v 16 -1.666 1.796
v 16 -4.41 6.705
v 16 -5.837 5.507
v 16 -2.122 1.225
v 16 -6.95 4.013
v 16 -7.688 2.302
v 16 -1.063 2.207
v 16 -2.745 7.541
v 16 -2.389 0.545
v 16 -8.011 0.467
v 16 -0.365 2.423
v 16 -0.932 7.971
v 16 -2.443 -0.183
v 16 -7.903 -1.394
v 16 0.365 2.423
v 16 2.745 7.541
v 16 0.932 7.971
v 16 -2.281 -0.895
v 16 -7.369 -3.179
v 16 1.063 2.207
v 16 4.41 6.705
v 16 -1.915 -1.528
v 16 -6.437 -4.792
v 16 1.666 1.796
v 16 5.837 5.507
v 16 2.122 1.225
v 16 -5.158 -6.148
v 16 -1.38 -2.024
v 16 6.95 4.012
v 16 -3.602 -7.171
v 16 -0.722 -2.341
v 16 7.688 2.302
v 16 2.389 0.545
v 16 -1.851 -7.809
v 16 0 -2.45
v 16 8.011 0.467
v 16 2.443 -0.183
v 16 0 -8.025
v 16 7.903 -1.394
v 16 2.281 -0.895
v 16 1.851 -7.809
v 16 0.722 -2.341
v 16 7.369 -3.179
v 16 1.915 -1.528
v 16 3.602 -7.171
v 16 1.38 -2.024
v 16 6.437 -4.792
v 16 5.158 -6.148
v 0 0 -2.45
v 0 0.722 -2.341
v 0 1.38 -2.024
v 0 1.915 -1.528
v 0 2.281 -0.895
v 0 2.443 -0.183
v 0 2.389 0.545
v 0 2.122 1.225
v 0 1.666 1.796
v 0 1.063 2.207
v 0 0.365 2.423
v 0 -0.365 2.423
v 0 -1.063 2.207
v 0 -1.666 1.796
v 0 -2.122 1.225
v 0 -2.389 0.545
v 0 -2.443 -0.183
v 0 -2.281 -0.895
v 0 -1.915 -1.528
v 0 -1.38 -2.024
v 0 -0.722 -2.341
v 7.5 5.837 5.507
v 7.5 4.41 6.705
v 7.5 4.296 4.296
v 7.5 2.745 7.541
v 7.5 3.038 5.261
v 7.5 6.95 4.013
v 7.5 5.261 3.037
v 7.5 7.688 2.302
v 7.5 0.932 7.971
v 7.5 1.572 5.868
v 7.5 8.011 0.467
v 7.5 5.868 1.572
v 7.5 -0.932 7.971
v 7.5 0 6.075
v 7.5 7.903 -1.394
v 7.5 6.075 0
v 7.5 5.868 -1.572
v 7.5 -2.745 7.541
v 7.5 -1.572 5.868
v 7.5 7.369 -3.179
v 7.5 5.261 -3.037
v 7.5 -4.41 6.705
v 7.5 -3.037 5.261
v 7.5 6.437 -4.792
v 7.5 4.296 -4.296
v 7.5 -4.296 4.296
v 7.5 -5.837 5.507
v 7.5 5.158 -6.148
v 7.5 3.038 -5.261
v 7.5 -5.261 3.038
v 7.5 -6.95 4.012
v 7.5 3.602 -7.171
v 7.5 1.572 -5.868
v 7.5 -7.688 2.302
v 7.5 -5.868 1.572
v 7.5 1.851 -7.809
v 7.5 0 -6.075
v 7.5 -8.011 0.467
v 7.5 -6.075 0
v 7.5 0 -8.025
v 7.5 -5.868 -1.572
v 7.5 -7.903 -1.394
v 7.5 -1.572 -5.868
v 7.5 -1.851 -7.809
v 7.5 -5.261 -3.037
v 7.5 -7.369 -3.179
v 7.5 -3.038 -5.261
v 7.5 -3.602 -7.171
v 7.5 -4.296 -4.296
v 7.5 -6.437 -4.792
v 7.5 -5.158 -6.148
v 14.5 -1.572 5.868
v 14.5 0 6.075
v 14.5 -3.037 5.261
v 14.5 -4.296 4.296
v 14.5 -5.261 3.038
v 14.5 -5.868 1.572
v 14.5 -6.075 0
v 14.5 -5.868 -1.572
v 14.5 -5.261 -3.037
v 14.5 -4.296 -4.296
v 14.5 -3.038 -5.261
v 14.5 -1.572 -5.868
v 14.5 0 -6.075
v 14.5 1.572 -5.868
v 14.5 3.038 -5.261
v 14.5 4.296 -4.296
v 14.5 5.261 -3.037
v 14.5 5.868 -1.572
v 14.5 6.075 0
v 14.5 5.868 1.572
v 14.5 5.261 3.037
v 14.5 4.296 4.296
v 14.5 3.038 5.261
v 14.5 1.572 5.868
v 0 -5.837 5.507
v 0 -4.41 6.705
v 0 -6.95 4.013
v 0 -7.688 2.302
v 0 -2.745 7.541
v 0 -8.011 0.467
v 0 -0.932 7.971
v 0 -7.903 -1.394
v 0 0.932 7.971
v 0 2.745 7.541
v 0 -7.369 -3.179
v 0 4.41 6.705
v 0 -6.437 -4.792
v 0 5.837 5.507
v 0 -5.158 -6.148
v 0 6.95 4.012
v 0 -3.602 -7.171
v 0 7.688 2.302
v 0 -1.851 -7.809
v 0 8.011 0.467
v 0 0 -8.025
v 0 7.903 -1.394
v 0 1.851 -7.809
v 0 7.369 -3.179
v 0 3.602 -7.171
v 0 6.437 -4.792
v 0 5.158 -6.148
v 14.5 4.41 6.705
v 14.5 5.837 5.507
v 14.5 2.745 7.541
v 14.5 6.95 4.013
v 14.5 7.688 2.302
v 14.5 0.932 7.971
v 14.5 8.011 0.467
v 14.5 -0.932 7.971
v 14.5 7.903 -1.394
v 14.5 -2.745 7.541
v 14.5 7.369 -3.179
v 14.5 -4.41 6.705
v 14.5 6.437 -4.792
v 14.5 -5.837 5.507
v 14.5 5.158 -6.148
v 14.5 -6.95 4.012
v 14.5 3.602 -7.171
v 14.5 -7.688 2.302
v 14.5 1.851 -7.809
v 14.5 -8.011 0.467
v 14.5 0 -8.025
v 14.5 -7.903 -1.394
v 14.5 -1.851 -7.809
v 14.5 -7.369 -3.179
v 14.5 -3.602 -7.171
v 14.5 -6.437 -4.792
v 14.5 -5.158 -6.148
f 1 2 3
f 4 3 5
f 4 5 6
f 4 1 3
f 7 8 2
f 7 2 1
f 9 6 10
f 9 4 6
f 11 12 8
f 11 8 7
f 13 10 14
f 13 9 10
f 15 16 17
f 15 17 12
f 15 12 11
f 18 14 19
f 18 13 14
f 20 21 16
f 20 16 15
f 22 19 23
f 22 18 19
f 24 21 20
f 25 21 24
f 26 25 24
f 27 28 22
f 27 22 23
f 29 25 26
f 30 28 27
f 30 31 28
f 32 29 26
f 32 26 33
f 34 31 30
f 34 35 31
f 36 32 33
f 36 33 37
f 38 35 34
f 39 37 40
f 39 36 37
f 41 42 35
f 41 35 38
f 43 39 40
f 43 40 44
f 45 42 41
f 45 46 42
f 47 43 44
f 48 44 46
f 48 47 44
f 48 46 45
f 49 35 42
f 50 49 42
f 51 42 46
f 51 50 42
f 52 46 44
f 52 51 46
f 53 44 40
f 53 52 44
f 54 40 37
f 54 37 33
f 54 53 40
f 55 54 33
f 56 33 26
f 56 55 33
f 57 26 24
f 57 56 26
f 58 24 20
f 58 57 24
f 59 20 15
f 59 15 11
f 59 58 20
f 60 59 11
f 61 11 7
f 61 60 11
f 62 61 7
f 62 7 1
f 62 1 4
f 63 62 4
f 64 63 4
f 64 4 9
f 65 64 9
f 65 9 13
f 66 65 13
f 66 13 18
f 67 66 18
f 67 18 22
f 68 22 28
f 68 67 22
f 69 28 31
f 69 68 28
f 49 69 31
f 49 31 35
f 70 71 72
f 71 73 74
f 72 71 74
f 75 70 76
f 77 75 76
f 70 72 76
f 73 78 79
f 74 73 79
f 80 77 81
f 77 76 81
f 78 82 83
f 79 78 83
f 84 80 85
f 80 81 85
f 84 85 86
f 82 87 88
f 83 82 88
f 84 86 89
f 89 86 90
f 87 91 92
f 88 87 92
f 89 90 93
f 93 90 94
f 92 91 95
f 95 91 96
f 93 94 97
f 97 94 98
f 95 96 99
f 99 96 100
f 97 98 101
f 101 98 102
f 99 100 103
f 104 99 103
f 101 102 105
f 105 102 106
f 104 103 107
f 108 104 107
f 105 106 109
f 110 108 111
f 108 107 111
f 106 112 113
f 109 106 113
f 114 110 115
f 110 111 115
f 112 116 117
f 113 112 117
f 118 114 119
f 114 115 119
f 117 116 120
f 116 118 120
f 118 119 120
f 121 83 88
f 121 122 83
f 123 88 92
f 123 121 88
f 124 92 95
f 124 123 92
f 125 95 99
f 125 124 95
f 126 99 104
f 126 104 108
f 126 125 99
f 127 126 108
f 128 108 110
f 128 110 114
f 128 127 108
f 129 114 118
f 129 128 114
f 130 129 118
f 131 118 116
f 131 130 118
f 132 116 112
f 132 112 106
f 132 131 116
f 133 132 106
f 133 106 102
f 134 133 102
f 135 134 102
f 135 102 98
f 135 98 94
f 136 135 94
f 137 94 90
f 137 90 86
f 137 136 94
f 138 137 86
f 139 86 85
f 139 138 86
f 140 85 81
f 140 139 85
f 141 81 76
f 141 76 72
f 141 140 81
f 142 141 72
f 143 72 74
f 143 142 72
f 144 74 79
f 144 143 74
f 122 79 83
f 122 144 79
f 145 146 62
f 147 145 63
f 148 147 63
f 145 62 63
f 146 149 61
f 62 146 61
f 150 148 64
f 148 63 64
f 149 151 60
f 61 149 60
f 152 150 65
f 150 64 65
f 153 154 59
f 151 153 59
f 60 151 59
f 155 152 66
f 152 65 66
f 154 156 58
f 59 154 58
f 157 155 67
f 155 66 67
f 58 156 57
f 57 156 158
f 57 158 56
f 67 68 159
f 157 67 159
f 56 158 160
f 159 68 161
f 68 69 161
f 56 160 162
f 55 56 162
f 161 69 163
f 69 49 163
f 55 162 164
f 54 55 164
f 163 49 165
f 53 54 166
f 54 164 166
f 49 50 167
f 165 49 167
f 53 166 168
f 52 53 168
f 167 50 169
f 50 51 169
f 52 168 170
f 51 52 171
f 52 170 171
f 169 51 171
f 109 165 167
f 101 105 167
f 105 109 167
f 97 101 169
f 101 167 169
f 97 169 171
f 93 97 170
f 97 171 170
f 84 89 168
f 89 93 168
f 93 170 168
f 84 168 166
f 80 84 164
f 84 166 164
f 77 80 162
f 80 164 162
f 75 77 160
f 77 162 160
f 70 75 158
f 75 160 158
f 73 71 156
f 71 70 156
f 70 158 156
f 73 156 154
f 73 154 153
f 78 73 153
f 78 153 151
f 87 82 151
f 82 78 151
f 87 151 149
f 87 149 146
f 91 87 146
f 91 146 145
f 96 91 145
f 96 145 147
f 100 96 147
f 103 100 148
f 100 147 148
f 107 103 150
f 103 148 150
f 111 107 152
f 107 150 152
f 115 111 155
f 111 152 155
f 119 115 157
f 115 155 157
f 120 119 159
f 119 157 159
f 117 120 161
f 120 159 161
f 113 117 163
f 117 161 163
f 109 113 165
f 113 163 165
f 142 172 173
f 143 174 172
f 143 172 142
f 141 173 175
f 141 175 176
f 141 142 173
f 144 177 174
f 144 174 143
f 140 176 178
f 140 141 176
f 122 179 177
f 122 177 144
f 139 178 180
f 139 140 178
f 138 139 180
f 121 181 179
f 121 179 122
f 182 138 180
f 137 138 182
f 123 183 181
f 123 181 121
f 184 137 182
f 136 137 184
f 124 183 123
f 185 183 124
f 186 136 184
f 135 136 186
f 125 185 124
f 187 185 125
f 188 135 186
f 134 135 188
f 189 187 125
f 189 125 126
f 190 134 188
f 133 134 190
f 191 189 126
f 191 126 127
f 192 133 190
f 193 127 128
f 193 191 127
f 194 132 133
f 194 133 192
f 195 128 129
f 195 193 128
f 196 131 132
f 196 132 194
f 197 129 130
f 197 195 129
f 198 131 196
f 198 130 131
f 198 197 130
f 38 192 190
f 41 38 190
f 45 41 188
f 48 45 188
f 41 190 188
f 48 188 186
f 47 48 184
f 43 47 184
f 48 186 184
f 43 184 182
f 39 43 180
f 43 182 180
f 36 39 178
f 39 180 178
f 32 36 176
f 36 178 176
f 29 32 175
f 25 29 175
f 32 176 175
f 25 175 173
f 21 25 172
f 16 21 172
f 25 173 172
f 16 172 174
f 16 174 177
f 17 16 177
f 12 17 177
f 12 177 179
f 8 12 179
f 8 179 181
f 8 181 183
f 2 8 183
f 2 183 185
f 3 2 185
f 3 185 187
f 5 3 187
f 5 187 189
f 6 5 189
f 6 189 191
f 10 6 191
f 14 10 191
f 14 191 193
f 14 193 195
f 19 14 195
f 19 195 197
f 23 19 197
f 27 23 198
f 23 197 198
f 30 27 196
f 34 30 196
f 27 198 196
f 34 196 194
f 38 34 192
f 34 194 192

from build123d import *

# Parameters (mm, degrees)
SKETCH1_R           = 8.025
SKETCH1_R_2         = 2.45
BOSS_EXTRUDE1_DEPTH = 16
SKETCH3_W           = 7
SKETCH3_H           = 1.95


with BuildPart() as part:
    # Sketch1 → Boss-Extrude1 (new body)
    with BuildSketch(Plane(origin=(0, 0, 0), x_dir=(0, 0, -1), z_dir=(1, 0, 0))):
        Circle(SKETCH1_R)
        Circle(SKETCH1_R_2, mode=Mode.SUBTRACT)
    extrude(amount=BOSS_EXTRUDE1_DEPTH)

    # Sketch3 → Cut-Revolve1 (revolve, cut)
    with BuildSketch(Plane.XY, mode=Mode.PRIVATE) as cut_revolve1_sk:
        with Locations((11, 7.05)):
            Rectangle(SKETCH3_W, SKETCH3_H)
    revolve(cut_revolve1_sk.sketch.rotate(Axis((-1.784254148, 0, 0), (1, 0, 0)), 90), axis=Axis((-1.784254148, 0, 0), (1, 0, 0)), mode=Mode.SUBTRACT)


solid = part.part
